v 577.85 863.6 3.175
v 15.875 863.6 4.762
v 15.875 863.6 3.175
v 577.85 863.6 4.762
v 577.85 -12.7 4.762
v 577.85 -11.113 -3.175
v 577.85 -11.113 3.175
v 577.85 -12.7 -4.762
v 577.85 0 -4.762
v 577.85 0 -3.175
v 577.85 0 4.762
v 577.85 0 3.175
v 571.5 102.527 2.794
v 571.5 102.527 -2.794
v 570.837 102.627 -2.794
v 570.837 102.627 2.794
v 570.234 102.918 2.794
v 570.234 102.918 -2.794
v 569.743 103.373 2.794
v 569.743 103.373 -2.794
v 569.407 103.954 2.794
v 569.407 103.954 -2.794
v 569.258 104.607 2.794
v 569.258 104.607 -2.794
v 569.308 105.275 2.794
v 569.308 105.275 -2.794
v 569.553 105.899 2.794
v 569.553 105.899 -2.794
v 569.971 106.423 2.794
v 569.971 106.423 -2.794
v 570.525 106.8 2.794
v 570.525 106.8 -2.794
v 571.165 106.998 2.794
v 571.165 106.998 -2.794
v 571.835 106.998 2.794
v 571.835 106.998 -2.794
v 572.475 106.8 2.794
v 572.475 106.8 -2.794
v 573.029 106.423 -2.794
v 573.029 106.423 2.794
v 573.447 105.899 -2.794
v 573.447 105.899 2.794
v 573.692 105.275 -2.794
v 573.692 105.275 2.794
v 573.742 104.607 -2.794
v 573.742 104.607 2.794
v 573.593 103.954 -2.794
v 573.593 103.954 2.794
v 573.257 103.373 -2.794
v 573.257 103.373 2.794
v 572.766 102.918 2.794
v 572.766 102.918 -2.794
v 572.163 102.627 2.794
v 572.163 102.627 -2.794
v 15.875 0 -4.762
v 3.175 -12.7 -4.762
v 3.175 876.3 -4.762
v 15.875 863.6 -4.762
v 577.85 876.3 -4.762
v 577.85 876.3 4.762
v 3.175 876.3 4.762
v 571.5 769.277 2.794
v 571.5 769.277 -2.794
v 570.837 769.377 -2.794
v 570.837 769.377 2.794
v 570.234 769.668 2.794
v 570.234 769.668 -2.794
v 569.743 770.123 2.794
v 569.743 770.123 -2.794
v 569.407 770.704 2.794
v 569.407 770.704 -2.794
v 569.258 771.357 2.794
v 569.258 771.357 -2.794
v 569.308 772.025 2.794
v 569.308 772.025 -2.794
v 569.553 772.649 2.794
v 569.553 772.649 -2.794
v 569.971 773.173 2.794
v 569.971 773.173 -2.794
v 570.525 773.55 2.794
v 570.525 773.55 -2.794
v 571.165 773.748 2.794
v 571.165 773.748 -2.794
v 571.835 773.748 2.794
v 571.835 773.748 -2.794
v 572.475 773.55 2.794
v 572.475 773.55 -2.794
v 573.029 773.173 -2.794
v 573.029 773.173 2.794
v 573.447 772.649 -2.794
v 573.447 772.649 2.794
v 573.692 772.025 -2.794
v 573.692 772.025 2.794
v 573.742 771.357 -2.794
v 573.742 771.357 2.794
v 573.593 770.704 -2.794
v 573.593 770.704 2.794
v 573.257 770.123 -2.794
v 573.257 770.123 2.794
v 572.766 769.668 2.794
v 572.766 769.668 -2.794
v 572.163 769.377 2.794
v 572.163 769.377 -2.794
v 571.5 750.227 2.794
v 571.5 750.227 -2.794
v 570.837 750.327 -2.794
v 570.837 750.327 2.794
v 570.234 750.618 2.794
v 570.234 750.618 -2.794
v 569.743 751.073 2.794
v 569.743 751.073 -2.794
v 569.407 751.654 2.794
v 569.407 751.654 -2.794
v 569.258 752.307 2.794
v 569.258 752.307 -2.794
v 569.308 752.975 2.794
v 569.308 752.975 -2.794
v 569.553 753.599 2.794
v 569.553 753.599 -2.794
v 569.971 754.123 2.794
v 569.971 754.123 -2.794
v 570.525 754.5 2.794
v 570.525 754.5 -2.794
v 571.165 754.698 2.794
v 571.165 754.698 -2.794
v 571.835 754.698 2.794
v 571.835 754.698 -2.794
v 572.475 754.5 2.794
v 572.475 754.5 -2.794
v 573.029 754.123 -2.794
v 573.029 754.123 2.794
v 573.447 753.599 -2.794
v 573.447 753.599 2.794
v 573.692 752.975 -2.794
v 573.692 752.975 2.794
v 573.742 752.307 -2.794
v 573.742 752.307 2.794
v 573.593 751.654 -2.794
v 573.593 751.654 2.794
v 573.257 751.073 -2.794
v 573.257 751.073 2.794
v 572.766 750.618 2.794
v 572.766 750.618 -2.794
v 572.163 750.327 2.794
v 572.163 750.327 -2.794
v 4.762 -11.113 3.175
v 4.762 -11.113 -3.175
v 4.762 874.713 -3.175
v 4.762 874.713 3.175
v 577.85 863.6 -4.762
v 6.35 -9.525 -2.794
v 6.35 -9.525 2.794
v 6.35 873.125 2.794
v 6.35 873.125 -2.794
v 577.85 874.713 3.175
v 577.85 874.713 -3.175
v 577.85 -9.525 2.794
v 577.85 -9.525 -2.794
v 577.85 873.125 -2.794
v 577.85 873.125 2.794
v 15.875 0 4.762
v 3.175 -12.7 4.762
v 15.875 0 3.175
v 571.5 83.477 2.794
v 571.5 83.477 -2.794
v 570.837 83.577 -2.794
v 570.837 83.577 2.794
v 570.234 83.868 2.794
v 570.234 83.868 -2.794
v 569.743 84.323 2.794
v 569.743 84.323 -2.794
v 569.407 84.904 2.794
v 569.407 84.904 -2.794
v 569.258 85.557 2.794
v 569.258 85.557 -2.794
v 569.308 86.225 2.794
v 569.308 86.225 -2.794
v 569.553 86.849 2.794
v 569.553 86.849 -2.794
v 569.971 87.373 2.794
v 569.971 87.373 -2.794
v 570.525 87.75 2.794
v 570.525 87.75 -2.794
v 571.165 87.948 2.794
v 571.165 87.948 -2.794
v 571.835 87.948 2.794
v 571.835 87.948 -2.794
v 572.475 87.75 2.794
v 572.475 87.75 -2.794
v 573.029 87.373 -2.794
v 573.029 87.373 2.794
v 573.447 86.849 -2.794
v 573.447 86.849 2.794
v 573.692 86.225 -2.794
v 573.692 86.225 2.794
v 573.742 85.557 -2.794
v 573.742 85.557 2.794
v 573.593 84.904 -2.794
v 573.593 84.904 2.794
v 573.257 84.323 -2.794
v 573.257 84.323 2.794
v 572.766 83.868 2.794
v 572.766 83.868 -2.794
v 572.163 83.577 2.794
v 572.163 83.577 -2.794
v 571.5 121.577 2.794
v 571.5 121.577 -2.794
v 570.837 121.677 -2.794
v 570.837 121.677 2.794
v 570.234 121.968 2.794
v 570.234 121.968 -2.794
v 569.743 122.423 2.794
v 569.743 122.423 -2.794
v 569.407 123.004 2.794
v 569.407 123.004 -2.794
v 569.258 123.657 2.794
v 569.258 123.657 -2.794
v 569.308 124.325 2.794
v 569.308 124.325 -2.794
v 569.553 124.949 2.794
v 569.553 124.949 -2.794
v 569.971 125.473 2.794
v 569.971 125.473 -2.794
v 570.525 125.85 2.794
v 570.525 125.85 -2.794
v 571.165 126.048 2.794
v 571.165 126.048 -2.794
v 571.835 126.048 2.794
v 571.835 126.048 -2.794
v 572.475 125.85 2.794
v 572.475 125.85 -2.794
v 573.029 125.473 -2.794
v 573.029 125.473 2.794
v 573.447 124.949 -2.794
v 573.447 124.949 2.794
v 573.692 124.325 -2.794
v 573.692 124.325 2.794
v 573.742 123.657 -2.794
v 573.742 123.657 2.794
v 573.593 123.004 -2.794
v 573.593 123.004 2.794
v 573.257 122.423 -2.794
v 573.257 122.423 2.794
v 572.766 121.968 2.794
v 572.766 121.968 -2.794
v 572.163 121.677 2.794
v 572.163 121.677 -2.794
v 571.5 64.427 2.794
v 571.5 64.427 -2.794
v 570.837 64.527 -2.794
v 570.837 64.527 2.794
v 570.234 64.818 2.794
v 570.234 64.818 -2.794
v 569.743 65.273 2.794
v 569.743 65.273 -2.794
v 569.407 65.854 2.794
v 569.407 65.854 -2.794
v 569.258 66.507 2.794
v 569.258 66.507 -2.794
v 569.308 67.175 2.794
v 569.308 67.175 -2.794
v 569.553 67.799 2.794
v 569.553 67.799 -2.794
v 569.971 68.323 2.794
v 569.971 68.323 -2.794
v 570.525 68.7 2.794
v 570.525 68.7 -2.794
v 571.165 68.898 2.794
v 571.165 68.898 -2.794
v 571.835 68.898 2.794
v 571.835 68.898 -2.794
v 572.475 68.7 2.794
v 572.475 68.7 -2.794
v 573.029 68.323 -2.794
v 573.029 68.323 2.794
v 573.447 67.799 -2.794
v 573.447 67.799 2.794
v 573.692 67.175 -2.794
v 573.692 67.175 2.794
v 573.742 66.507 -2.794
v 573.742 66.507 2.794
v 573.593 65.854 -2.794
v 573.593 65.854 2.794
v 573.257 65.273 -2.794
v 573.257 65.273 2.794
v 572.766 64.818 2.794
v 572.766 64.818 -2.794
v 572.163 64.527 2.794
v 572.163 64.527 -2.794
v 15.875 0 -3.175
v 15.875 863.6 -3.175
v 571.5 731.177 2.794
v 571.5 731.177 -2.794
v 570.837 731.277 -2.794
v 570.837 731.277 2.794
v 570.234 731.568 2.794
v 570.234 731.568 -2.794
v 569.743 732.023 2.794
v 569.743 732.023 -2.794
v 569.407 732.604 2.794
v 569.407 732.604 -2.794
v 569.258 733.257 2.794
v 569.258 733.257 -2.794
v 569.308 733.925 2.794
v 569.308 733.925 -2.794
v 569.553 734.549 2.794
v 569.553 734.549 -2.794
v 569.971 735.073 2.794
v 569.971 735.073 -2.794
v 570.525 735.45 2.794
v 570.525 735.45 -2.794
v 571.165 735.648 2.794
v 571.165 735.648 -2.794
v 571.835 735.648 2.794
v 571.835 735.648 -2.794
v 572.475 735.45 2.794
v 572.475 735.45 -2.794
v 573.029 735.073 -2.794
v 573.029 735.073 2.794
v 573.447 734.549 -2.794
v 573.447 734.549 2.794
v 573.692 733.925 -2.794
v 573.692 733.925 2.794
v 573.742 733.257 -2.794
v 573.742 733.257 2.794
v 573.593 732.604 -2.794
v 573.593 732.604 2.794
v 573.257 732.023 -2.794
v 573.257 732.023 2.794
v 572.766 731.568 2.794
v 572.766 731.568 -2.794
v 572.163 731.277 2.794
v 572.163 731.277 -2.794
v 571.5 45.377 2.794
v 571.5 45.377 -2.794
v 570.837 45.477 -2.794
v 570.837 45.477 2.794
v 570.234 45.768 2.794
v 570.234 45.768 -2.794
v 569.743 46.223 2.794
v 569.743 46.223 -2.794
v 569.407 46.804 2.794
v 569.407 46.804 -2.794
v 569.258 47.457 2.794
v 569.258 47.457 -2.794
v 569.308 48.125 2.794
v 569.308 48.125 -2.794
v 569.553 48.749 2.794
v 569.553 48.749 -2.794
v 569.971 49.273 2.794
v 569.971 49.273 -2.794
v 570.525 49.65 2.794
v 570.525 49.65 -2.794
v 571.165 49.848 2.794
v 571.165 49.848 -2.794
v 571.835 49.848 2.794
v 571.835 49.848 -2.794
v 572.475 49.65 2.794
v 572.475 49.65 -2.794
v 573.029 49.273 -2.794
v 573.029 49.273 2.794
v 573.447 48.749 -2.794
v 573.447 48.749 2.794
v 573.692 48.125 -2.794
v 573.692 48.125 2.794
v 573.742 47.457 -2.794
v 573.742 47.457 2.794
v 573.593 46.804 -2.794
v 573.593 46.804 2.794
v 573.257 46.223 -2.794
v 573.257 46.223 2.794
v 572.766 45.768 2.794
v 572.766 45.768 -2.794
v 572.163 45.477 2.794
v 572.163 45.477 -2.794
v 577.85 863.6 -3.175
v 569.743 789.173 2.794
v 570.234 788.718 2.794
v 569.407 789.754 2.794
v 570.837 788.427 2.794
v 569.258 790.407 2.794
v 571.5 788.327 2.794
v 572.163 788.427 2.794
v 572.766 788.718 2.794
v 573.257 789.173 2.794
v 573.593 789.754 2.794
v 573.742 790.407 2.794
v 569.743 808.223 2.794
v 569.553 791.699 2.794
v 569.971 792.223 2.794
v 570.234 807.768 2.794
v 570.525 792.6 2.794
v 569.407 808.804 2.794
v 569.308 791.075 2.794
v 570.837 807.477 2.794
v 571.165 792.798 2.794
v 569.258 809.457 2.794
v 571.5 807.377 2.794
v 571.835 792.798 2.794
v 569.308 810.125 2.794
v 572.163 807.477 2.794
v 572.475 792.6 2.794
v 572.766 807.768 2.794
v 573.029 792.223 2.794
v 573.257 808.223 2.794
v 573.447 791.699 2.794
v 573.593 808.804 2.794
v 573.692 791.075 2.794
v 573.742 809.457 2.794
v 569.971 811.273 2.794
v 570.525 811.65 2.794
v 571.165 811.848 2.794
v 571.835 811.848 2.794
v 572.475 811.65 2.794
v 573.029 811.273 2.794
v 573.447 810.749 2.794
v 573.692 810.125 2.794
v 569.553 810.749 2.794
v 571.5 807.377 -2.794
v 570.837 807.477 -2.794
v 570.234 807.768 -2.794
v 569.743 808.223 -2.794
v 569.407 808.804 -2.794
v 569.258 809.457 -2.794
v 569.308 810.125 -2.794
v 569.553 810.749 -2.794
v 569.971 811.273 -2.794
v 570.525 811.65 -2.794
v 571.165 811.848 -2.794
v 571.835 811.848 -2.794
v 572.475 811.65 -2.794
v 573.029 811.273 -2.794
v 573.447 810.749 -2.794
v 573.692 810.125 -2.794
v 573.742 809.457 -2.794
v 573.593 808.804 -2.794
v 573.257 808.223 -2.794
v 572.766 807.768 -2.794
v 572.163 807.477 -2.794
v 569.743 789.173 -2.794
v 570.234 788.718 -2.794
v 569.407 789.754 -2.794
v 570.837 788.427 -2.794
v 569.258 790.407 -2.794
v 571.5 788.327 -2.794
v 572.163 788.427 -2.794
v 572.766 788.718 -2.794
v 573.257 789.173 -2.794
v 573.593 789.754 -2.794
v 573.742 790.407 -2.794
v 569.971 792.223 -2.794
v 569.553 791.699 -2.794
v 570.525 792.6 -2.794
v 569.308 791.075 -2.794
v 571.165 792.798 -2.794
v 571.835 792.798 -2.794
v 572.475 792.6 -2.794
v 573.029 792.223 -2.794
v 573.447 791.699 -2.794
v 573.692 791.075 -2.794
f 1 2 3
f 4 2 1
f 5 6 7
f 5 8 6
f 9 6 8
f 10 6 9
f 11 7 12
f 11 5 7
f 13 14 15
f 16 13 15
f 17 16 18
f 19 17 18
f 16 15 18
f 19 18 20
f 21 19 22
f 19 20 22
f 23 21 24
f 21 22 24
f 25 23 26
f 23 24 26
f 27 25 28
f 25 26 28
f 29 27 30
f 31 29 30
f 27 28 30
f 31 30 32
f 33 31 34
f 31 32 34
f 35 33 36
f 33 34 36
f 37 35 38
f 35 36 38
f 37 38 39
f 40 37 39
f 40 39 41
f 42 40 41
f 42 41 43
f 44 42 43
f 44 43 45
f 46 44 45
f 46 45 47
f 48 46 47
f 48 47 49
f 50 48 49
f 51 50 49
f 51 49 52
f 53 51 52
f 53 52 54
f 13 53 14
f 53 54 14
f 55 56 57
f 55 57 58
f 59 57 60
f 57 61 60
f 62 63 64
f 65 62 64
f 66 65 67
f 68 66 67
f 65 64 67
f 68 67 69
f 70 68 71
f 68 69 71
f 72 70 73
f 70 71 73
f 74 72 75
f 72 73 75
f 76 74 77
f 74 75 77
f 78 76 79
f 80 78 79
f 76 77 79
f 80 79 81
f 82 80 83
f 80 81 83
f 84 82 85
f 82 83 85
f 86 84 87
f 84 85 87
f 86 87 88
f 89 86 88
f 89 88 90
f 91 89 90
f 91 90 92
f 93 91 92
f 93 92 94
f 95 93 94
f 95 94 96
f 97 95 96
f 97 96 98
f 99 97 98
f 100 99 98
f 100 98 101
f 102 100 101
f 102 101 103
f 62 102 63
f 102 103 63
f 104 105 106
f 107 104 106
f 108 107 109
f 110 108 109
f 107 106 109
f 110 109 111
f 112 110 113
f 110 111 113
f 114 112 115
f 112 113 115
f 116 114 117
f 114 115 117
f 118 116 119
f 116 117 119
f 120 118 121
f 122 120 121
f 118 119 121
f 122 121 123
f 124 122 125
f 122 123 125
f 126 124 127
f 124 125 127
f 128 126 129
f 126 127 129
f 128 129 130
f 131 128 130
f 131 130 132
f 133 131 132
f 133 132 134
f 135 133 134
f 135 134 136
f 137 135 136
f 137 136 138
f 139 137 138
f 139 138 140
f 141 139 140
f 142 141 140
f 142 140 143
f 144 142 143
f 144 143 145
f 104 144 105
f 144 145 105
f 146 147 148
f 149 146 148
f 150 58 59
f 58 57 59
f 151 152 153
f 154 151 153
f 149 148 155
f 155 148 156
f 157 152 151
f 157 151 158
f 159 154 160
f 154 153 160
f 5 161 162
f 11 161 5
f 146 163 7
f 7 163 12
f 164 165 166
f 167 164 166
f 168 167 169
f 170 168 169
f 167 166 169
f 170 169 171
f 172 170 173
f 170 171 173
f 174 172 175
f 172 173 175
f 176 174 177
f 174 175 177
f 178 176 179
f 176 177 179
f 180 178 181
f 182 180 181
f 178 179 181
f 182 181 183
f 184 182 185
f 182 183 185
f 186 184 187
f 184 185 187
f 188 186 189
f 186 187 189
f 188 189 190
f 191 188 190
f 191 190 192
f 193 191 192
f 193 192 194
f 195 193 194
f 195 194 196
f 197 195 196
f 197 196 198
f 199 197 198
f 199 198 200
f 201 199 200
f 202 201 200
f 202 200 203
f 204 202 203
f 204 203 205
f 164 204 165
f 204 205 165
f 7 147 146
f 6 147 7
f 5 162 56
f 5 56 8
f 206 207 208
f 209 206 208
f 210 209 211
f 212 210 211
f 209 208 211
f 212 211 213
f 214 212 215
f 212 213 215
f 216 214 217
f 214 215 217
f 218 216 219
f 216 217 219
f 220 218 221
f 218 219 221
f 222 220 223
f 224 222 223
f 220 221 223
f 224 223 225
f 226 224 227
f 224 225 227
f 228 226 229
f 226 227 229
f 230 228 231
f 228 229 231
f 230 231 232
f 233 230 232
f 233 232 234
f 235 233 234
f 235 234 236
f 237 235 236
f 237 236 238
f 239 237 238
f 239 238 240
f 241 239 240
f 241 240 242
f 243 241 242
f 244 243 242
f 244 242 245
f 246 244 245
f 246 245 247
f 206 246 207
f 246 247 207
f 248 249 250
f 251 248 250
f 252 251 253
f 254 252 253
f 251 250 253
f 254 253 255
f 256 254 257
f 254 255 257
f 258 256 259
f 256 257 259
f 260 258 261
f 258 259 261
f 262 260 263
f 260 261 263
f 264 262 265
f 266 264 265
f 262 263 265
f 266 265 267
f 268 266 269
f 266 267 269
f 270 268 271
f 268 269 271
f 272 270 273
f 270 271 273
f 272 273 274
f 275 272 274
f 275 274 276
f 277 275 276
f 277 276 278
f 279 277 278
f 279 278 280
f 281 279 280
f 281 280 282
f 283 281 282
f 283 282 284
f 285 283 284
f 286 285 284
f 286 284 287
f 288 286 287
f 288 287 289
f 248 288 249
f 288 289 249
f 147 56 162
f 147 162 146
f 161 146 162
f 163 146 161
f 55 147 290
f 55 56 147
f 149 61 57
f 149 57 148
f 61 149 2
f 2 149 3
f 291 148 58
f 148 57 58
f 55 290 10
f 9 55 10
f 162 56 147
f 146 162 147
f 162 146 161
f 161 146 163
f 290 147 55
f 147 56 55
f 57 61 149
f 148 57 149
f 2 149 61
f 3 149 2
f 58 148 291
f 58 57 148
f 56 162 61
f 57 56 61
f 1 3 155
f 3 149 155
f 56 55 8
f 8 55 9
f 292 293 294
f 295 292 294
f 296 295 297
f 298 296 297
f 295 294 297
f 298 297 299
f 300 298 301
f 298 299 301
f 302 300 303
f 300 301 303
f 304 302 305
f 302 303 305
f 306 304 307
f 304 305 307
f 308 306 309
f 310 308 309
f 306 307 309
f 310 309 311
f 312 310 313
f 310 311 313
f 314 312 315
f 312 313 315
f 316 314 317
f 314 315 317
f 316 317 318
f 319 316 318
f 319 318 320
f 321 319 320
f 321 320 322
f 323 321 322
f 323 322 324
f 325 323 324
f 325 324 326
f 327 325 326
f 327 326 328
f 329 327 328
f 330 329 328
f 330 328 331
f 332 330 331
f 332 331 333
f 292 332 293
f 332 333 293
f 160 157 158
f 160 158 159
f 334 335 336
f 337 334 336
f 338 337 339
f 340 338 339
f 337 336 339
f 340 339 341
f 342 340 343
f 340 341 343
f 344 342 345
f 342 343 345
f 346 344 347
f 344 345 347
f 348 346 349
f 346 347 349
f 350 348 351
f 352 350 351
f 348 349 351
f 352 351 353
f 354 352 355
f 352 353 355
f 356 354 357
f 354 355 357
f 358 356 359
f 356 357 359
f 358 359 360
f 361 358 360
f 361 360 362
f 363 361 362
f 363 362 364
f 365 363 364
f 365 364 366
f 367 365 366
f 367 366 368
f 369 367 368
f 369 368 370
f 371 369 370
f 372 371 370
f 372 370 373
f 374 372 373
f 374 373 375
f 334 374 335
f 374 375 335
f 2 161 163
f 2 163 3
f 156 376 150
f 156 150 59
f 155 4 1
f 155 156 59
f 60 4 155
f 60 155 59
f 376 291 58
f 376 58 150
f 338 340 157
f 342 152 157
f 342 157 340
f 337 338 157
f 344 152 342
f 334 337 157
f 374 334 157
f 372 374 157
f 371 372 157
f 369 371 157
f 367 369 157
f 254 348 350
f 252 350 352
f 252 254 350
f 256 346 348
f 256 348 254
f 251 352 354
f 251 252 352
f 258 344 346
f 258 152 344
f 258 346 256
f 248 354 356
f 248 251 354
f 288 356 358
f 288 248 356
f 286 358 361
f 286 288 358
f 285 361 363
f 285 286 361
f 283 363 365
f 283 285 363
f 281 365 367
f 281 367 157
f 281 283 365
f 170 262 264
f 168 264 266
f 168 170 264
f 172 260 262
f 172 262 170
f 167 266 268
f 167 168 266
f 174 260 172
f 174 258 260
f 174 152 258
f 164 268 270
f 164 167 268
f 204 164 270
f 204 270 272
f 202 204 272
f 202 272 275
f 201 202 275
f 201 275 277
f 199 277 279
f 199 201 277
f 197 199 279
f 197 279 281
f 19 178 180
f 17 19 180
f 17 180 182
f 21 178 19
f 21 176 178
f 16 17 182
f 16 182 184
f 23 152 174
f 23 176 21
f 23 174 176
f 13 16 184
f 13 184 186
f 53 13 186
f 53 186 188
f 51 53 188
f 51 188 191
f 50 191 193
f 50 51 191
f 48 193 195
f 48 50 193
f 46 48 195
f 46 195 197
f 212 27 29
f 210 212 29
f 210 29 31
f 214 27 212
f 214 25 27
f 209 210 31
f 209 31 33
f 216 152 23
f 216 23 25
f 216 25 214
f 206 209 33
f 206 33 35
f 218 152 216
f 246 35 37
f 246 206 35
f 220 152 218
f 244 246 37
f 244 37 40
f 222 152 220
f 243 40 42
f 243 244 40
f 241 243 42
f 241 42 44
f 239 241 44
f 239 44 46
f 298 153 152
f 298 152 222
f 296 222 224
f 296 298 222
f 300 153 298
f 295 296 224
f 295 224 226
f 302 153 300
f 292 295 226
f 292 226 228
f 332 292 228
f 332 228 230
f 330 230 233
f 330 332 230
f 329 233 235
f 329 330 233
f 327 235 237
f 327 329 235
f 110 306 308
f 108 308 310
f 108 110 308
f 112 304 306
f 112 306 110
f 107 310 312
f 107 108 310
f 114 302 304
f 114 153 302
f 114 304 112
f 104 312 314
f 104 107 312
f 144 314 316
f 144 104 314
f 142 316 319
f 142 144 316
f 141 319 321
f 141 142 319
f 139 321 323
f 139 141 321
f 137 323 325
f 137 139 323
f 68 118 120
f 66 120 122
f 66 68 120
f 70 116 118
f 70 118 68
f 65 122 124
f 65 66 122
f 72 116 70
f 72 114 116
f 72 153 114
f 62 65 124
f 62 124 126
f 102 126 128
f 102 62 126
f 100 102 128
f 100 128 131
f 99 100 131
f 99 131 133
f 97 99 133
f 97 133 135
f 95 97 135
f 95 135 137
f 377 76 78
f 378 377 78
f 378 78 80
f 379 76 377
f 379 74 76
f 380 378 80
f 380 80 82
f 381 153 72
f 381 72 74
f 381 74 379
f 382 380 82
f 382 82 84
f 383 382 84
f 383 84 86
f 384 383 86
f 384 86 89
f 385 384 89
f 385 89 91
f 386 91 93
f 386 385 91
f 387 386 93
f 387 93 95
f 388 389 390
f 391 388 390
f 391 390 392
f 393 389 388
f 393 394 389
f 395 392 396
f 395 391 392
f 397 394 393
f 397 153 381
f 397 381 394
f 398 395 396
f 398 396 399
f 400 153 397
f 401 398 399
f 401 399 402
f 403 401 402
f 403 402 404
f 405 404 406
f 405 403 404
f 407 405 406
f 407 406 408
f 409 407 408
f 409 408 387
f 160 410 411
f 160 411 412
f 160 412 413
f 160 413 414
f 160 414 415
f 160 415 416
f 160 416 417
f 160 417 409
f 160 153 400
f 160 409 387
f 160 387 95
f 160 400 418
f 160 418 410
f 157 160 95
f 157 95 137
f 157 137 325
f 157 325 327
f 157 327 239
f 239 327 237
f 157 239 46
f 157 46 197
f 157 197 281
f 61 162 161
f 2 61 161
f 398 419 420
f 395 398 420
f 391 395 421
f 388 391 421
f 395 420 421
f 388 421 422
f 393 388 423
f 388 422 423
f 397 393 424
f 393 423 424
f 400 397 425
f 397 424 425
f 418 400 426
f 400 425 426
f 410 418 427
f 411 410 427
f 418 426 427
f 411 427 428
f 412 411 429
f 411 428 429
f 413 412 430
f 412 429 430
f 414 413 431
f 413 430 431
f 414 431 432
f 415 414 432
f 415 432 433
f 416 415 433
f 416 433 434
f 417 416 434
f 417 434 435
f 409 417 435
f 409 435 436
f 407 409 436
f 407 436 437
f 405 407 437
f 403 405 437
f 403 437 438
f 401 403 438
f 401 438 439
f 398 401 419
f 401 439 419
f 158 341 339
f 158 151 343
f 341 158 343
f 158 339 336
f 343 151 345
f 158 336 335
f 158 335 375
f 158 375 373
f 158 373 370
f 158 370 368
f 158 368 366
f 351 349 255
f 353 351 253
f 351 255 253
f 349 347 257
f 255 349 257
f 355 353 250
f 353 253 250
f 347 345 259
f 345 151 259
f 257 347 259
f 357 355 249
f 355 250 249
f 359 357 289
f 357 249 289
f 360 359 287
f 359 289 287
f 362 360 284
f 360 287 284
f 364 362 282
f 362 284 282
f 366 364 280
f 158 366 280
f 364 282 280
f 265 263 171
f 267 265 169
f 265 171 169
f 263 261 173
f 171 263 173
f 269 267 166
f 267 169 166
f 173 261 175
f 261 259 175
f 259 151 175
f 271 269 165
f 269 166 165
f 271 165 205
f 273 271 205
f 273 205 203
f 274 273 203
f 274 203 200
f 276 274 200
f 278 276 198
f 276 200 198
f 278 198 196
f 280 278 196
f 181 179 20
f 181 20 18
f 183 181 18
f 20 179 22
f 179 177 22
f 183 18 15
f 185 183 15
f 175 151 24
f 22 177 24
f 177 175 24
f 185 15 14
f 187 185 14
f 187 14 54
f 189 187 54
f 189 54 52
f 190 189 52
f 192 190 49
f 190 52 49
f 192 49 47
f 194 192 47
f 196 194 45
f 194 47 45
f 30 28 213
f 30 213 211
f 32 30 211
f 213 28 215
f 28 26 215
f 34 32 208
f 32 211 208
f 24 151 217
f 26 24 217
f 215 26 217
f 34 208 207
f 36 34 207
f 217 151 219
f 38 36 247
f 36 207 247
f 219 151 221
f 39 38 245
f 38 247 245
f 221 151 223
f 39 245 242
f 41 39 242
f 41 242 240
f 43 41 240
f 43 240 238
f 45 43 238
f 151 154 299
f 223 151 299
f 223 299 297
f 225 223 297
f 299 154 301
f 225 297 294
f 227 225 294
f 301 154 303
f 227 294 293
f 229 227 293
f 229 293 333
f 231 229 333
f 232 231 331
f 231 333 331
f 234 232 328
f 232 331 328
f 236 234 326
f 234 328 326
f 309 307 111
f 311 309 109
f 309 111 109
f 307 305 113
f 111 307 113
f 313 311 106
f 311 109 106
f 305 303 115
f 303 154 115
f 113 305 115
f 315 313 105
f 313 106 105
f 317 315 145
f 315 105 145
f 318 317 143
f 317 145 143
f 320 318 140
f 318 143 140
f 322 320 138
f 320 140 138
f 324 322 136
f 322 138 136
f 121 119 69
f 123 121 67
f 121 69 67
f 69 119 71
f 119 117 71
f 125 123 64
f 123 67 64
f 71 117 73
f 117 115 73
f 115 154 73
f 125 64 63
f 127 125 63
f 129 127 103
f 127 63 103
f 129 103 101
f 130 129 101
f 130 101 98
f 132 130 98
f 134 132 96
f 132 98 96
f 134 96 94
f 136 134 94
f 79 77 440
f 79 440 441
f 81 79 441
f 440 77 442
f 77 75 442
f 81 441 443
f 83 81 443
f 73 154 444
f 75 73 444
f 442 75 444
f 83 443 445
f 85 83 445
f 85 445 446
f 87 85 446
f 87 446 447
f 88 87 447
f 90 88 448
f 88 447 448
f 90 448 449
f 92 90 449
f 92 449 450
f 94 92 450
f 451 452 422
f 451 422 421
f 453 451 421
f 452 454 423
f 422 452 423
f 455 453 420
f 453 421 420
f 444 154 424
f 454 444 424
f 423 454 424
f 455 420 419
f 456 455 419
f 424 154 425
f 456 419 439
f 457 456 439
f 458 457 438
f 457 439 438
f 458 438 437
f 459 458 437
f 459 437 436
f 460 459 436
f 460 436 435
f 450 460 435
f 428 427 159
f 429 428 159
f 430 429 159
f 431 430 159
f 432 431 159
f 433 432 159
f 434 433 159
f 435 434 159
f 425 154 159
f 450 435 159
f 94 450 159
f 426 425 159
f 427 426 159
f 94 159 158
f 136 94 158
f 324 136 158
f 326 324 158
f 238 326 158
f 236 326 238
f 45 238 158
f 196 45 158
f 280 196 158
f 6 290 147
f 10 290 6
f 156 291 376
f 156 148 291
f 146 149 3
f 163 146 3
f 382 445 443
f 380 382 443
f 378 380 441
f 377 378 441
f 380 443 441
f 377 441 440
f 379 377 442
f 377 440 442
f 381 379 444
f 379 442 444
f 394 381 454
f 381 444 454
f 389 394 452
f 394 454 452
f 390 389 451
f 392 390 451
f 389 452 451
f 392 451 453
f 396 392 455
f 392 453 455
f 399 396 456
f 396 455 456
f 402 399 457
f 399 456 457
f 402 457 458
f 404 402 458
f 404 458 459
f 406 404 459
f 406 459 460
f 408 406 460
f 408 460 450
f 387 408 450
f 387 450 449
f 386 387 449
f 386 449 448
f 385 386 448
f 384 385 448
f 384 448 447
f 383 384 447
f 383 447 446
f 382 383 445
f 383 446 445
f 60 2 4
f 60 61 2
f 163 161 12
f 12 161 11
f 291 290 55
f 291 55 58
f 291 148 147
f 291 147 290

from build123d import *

# Parameters (mm, degrees)
SKETCH2_W                             = 574.675
SKETCH2_H                             = 889
FRAME_OUTER_DIMENSIONS_DEPTH          = 4.7625
SKETCH3_W                             = 561.975
SKETCH3_H                             = 863.6
FRAME_INNER_DIMENSIONS_DEPTH          = 1050.71569395
FRAME_PROFILE_DEPTH                   = 3.175
FRAME_PROFILE_DEPTH_BACK              = 3.175
SKETCH4_W                             = 573.0875
SKETCH4_H                             = 885.825
FRAME_SECTION_SPLIT_SURFACE_1_1_BACK  = 1059.614
FRAME_SECTION_SPLIT_SURFACE_1_1_DEPTH = 2119.228
FRAME_SECTION_SPLIT_SURFACE_1_2_BACK  = 1059.614
FRAME_SECTION_SPLIT_SURFACE_1_2_DEPTH = 2119.228
FRAME_SECTION_SPLIT_SURFACE_2_3_BACK  = 1059.614
FRAME_SECTION_SPLIT_SURFACE_2_3_DEPTH = 2119.228
FRAME_SECTION_SPLIT_SURFACE_2_4_BACK  = 1059.614
FRAME_SECTION_SPLIT_SURFACE_2_4_DEPTH = 2119.228
SKETCH5_W                             = 571.5
SKETCH5_H                             = 882.65
DOOR_PANEL_DEPTH                      = 2.794
SKETCH9_W                             = 2.2479
SKETCH9_H                             = 7.5565
F_8_CLEARANCE_HOLE1_AT_2_COUNT        = 2
F_8_CLEARANCE_HOLE1_AT_2_PITCH        = 19.05
F_8_CLEARANCE_HOLE1_AT_3_COUNT        = 2
F_8_CLEARANCE_HOLE1_AT_3_PITCH        = 38.1
F_8_CLEARANCE_HOLE1_AT_4_COUNT        = 2
F_8_CLEARANCE_HOLE1_AT_4_PITCH        = 57.15
F_8_CLEARANCE_HOLE1_AT_5_COUNT        = 2
F_8_CLEARANCE_HOLE1_AT_5_PITCH        = 76.2
F_8_CLEARANCE_HOLE1_AT_6_COUNT        = 2
F_8_CLEARANCE_HOLE1_AT_6_PITCH        = 704.85
F_8_CLEARANCE_HOLE1_AT_7_COUNT        = 2
F_8_CLEARANCE_HOLE1_AT_7_PITCH        = 723.9
F_8_CLEARANCE_HOLE1_AT_8_COUNT        = 2
F_8_CLEARANCE_HOLE1_AT_8_PITCH        = 742.95
F_8_CLEARANCE_HOLE1_AT_9_COUNT        = 2
F_8_CLEARANCE_HOLE1_AT_9_PITCH        = 762
F_8_CLEARANCE_HOLE1_AT_10_COUNT       = 2
F_8_CLEARANCE_HOLE1_AT_10_PITCH       = 685.8


with BuildPart() as part:
    # Sketch2 → Frame outer dimensions (new, symmetric)
    with BuildSketch(Plane.XY):
        with Locations((290.5125, 431.8)):
            Rectangle(SKETCH2_W, SKETCH2_H)
    extrude(amount=FRAME_OUTER_DIMENSIONS_DEPTH, both=True)

    # Sketch3 → Frame inner dimensions (cut, through all)
    with BuildSketch(Plane.XY.offset(4.7625)):
        with Locations((296.8625, 431.8)):
            Rectangle(SKETCH3_W, SKETCH3_H)
    extrude(amount=-FRAME_INNER_DIMENSIONS_DEPTH, mode=Mode.SUBTRACT)

    # Sketch4 → Frame profile (cut, two sides: drawn at the far end of the back side and taken through both)
    with BuildSketch(Plane.XY.offset(-FRAME_PROFILE_DEPTH_BACK)):
        with Locations((291.30625, 431.8)):
            Rectangle(SKETCH4_W, SKETCH4_H)
    extrude(amount=FRAME_PROFILE_DEPTH + FRAME_PROFILE_DEPTH_BACK, mode=Mode.SUBTRACT)


with BuildPart() as body_2:
    # Frame section split: the piece behind the surface
    add(part.part)
    # Frame section split surface 1: a surface, the sketch's curves swept straight by 2119.228 mm
    with BuildLine(Plane.XY.offset(4.7625).offset(-FRAME_SECTION_SPLIT_SURFACE_1_1_BACK), mode=Mode.PRIVATE) as frame_section_split_surface_1_1_path:
        Line((3.175, 876.3), (15.875, 863.6))
    frame_section_split_surface_1_1 = Shell.extrude(frame_section_split_surface_1_1_path.wire(), (0 * FRAME_SECTION_SPLIT_SURFACE_1_1_DEPTH, 0 * FRAME_SECTION_SPLIT_SURFACE_1_1_DEPTH, 1 * FRAME_SECTION_SPLIT_SURFACE_1_1_DEPTH))
    split(bisect_by=frame_section_split_surface_1_1, keep=Keep.BOTTOM)


with BuildPart() as part_1:
    add(part.part)

    # Frame section split: split by a surface, the side it looks to stays
    # Frame section split surface 1: a surface, the sketch's curves swept straight by 2119.228 mm
    with BuildLine(Plane.XY.offset(4.7625).offset(-FRAME_SECTION_SPLIT_SURFACE_1_2_BACK), mode=Mode.PRIVATE) as frame_section_split_surface_1_2_path:
        Line((3.175, 876.3), (15.875, 863.6))
    frame_section_split_surface_1_2 = Shell.extrude(frame_section_split_surface_1_2_path.wire(), (0 * FRAME_SECTION_SPLIT_SURFACE_1_2_DEPTH, 0 * FRAME_SECTION_SPLIT_SURFACE_1_2_DEPTH, 1 * FRAME_SECTION_SPLIT_SURFACE_1_2_DEPTH))
    split(bisect_by=frame_section_split_surface_1_2, keep=Keep.TOP)


with BuildPart() as body_3:
    # Frame section split 2 body 2: the piece behind the surface
    add(body_2.part)
    # Frame section split surface 2: a surface, the sketch's curves swept straight by 2119.228 mm
    with BuildLine(Plane.XY.offset(4.7625).offset(-FRAME_SECTION_SPLIT_SURFACE_2_3_BACK), mode=Mode.PRIVATE) as frame_section_split_surface_2_3_path:
        Line((3.175, -12.7), (15.875, 0))
    frame_section_split_surface_2_3 = Shell.extrude(frame_section_split_surface_2_3_path.wire(), (0 * FRAME_SECTION_SPLIT_SURFACE_2_3_DEPTH, 0 * FRAME_SECTION_SPLIT_SURFACE_2_3_DEPTH, 1 * FRAME_SECTION_SPLIT_SURFACE_2_3_DEPTH))
    split(bisect_by=frame_section_split_surface_2_3, keep=Keep.BOTTOM)


with BuildPart() as body_2_1:
    add(body_2.part)

    # Frame section split 2 body 2: split by a surface, the side it looks to stays
    # Frame section split surface 2: a surface, the sketch's curves swept straight by 2119.228 mm
    with BuildLine(Plane.XY.offset(4.7625).offset(-FRAME_SECTION_SPLIT_SURFACE_2_4_BACK), mode=Mode.PRIVATE) as frame_section_split_surface_2_4_path:
        Line((3.175, -12.7), (15.875, 0))
    frame_section_split_surface_2_4 = Shell.extrude(frame_section_split_surface_2_4_path.wire(), (0 * FRAME_SECTION_SPLIT_SURFACE_2_4_DEPTH, 0 * FRAME_SECTION_SPLIT_SURFACE_2_4_DEPTH, 1 * FRAME_SECTION_SPLIT_SURFACE_2_4_DEPTH))
    split(bisect_by=frame_section_split_surface_2_4, keep=Keep.TOP)


with BuildPart() as body_4:
    # Sketch5 → Door panel (new, symmetric)
    with BuildSketch(Plane.XY):
        with Locations((292.1, 431.8)):
            Rectangle(SKETCH5_W, SKETCH5_H)
    extrude(amount=DOOR_PANEL_DEPTH, both=True)

    # Sketch9 → #8 Clearance Hole1 (revolve, cut)
    with BuildSketch(Plane(origin=(571.5, 47.625, 2.794), x_dir=(0, -1, 0), z_dir=(1, 0, 0))):
        with Locations((1.12395, 3.77825)):
            Rectangle(SKETCH9_W, SKETCH9_H)
    f_8_clearance_hole1 = revolve(axis=Axis((571.5, 47.625, 9.144), (0, 0, -1)), mode=Mode.SUBTRACT)

    # #8 Clearance Hole1 at 2: #8 Clearance Hole1 ×2
    with Locations(*[(0, i * F_8_CLEARANCE_HOLE1_AT_2_PITCH, 0) for i in range(1, F_8_CLEARANCE_HOLE1_AT_2_COUNT)]):
        add(f_8_clearance_hole1, mode=Mode.SUBTRACT)

    # #8 Clearance Hole1 at 3: #8 Clearance Hole1 ×2
    with Locations(*[(0, i * F_8_CLEARANCE_HOLE1_AT_3_PITCH, 0) for i in range(1, F_8_CLEARANCE_HOLE1_AT_3_COUNT)]):
        add(f_8_clearance_hole1, mode=Mode.SUBTRACT)

    # #8 Clearance Hole1 at 4: #8 Clearance Hole1 ×2
    with Locations(*[(0, i * F_8_CLEARANCE_HOLE1_AT_4_PITCH, 0) for i in range(1, F_8_CLEARANCE_HOLE1_AT_4_COUNT)]):
        add(f_8_clearance_hole1, mode=Mode.SUBTRACT)

    # #8 Clearance Hole1 at 5: #8 Clearance Hole1 ×2
    with Locations(*[(0, i * F_8_CLEARANCE_HOLE1_AT_5_PITCH, 0) for i in range(1, F_8_CLEARANCE_HOLE1_AT_5_COUNT)]):
        add(f_8_clearance_hole1, mode=Mode.SUBTRACT)

    # #8 Clearance Hole1 at 6: #8 Clearance Hole1 ×2
    with Locations(*[(0, i * F_8_CLEARANCE_HOLE1_AT_6_PITCH, 0) for i in range(1, F_8_CLEARANCE_HOLE1_AT_6_COUNT)]):
        add(f_8_clearance_hole1, mode=Mode.SUBTRACT)

    # #8 Clearance Hole1 at 7: #8 Clearance Hole1 ×2
    with Locations(*[(0, i * F_8_CLEARANCE_HOLE1_AT_7_PITCH, 0) for i in range(1, F_8_CLEARANCE_HOLE1_AT_7_COUNT)]):
        add(f_8_clearance_hole1, mode=Mode.SUBTRACT)

    # #8 Clearance Hole1 at 8: #8 Clearance Hole1 ×2
    with Locations(*[(0, i * F_8_CLEARANCE_HOLE1_AT_8_PITCH, 0) for i in range(1, F_8_CLEARANCE_HOLE1_AT_8_COUNT)]):
        add(f_8_clearance_hole1, mode=Mode.SUBTRACT)

    # #8 Clearance Hole1 at 9: #8 Clearance Hole1 ×2
    with Locations(*[(0, i * F_8_CLEARANCE_HOLE1_AT_9_PITCH, 0) for i in range(1, F_8_CLEARANCE_HOLE1_AT_9_COUNT)]):
        add(f_8_clearance_hole1, mode=Mode.SUBTRACT)

    # #8 Clearance Hole1 at 10: #8 Clearance Hole1 ×2
    with Locations(*[(0, i * F_8_CLEARANCE_HOLE1_AT_10_PITCH, 0) for i in range(1, F_8_CLEARANCE_HOLE1_AT_10_COUNT)]):
        add(f_8_clearance_hole1, mode=Mode.SUBTRACT)


solid = Compound([part_1.part, body_3.part, body_2_1.part, body_4.part])
